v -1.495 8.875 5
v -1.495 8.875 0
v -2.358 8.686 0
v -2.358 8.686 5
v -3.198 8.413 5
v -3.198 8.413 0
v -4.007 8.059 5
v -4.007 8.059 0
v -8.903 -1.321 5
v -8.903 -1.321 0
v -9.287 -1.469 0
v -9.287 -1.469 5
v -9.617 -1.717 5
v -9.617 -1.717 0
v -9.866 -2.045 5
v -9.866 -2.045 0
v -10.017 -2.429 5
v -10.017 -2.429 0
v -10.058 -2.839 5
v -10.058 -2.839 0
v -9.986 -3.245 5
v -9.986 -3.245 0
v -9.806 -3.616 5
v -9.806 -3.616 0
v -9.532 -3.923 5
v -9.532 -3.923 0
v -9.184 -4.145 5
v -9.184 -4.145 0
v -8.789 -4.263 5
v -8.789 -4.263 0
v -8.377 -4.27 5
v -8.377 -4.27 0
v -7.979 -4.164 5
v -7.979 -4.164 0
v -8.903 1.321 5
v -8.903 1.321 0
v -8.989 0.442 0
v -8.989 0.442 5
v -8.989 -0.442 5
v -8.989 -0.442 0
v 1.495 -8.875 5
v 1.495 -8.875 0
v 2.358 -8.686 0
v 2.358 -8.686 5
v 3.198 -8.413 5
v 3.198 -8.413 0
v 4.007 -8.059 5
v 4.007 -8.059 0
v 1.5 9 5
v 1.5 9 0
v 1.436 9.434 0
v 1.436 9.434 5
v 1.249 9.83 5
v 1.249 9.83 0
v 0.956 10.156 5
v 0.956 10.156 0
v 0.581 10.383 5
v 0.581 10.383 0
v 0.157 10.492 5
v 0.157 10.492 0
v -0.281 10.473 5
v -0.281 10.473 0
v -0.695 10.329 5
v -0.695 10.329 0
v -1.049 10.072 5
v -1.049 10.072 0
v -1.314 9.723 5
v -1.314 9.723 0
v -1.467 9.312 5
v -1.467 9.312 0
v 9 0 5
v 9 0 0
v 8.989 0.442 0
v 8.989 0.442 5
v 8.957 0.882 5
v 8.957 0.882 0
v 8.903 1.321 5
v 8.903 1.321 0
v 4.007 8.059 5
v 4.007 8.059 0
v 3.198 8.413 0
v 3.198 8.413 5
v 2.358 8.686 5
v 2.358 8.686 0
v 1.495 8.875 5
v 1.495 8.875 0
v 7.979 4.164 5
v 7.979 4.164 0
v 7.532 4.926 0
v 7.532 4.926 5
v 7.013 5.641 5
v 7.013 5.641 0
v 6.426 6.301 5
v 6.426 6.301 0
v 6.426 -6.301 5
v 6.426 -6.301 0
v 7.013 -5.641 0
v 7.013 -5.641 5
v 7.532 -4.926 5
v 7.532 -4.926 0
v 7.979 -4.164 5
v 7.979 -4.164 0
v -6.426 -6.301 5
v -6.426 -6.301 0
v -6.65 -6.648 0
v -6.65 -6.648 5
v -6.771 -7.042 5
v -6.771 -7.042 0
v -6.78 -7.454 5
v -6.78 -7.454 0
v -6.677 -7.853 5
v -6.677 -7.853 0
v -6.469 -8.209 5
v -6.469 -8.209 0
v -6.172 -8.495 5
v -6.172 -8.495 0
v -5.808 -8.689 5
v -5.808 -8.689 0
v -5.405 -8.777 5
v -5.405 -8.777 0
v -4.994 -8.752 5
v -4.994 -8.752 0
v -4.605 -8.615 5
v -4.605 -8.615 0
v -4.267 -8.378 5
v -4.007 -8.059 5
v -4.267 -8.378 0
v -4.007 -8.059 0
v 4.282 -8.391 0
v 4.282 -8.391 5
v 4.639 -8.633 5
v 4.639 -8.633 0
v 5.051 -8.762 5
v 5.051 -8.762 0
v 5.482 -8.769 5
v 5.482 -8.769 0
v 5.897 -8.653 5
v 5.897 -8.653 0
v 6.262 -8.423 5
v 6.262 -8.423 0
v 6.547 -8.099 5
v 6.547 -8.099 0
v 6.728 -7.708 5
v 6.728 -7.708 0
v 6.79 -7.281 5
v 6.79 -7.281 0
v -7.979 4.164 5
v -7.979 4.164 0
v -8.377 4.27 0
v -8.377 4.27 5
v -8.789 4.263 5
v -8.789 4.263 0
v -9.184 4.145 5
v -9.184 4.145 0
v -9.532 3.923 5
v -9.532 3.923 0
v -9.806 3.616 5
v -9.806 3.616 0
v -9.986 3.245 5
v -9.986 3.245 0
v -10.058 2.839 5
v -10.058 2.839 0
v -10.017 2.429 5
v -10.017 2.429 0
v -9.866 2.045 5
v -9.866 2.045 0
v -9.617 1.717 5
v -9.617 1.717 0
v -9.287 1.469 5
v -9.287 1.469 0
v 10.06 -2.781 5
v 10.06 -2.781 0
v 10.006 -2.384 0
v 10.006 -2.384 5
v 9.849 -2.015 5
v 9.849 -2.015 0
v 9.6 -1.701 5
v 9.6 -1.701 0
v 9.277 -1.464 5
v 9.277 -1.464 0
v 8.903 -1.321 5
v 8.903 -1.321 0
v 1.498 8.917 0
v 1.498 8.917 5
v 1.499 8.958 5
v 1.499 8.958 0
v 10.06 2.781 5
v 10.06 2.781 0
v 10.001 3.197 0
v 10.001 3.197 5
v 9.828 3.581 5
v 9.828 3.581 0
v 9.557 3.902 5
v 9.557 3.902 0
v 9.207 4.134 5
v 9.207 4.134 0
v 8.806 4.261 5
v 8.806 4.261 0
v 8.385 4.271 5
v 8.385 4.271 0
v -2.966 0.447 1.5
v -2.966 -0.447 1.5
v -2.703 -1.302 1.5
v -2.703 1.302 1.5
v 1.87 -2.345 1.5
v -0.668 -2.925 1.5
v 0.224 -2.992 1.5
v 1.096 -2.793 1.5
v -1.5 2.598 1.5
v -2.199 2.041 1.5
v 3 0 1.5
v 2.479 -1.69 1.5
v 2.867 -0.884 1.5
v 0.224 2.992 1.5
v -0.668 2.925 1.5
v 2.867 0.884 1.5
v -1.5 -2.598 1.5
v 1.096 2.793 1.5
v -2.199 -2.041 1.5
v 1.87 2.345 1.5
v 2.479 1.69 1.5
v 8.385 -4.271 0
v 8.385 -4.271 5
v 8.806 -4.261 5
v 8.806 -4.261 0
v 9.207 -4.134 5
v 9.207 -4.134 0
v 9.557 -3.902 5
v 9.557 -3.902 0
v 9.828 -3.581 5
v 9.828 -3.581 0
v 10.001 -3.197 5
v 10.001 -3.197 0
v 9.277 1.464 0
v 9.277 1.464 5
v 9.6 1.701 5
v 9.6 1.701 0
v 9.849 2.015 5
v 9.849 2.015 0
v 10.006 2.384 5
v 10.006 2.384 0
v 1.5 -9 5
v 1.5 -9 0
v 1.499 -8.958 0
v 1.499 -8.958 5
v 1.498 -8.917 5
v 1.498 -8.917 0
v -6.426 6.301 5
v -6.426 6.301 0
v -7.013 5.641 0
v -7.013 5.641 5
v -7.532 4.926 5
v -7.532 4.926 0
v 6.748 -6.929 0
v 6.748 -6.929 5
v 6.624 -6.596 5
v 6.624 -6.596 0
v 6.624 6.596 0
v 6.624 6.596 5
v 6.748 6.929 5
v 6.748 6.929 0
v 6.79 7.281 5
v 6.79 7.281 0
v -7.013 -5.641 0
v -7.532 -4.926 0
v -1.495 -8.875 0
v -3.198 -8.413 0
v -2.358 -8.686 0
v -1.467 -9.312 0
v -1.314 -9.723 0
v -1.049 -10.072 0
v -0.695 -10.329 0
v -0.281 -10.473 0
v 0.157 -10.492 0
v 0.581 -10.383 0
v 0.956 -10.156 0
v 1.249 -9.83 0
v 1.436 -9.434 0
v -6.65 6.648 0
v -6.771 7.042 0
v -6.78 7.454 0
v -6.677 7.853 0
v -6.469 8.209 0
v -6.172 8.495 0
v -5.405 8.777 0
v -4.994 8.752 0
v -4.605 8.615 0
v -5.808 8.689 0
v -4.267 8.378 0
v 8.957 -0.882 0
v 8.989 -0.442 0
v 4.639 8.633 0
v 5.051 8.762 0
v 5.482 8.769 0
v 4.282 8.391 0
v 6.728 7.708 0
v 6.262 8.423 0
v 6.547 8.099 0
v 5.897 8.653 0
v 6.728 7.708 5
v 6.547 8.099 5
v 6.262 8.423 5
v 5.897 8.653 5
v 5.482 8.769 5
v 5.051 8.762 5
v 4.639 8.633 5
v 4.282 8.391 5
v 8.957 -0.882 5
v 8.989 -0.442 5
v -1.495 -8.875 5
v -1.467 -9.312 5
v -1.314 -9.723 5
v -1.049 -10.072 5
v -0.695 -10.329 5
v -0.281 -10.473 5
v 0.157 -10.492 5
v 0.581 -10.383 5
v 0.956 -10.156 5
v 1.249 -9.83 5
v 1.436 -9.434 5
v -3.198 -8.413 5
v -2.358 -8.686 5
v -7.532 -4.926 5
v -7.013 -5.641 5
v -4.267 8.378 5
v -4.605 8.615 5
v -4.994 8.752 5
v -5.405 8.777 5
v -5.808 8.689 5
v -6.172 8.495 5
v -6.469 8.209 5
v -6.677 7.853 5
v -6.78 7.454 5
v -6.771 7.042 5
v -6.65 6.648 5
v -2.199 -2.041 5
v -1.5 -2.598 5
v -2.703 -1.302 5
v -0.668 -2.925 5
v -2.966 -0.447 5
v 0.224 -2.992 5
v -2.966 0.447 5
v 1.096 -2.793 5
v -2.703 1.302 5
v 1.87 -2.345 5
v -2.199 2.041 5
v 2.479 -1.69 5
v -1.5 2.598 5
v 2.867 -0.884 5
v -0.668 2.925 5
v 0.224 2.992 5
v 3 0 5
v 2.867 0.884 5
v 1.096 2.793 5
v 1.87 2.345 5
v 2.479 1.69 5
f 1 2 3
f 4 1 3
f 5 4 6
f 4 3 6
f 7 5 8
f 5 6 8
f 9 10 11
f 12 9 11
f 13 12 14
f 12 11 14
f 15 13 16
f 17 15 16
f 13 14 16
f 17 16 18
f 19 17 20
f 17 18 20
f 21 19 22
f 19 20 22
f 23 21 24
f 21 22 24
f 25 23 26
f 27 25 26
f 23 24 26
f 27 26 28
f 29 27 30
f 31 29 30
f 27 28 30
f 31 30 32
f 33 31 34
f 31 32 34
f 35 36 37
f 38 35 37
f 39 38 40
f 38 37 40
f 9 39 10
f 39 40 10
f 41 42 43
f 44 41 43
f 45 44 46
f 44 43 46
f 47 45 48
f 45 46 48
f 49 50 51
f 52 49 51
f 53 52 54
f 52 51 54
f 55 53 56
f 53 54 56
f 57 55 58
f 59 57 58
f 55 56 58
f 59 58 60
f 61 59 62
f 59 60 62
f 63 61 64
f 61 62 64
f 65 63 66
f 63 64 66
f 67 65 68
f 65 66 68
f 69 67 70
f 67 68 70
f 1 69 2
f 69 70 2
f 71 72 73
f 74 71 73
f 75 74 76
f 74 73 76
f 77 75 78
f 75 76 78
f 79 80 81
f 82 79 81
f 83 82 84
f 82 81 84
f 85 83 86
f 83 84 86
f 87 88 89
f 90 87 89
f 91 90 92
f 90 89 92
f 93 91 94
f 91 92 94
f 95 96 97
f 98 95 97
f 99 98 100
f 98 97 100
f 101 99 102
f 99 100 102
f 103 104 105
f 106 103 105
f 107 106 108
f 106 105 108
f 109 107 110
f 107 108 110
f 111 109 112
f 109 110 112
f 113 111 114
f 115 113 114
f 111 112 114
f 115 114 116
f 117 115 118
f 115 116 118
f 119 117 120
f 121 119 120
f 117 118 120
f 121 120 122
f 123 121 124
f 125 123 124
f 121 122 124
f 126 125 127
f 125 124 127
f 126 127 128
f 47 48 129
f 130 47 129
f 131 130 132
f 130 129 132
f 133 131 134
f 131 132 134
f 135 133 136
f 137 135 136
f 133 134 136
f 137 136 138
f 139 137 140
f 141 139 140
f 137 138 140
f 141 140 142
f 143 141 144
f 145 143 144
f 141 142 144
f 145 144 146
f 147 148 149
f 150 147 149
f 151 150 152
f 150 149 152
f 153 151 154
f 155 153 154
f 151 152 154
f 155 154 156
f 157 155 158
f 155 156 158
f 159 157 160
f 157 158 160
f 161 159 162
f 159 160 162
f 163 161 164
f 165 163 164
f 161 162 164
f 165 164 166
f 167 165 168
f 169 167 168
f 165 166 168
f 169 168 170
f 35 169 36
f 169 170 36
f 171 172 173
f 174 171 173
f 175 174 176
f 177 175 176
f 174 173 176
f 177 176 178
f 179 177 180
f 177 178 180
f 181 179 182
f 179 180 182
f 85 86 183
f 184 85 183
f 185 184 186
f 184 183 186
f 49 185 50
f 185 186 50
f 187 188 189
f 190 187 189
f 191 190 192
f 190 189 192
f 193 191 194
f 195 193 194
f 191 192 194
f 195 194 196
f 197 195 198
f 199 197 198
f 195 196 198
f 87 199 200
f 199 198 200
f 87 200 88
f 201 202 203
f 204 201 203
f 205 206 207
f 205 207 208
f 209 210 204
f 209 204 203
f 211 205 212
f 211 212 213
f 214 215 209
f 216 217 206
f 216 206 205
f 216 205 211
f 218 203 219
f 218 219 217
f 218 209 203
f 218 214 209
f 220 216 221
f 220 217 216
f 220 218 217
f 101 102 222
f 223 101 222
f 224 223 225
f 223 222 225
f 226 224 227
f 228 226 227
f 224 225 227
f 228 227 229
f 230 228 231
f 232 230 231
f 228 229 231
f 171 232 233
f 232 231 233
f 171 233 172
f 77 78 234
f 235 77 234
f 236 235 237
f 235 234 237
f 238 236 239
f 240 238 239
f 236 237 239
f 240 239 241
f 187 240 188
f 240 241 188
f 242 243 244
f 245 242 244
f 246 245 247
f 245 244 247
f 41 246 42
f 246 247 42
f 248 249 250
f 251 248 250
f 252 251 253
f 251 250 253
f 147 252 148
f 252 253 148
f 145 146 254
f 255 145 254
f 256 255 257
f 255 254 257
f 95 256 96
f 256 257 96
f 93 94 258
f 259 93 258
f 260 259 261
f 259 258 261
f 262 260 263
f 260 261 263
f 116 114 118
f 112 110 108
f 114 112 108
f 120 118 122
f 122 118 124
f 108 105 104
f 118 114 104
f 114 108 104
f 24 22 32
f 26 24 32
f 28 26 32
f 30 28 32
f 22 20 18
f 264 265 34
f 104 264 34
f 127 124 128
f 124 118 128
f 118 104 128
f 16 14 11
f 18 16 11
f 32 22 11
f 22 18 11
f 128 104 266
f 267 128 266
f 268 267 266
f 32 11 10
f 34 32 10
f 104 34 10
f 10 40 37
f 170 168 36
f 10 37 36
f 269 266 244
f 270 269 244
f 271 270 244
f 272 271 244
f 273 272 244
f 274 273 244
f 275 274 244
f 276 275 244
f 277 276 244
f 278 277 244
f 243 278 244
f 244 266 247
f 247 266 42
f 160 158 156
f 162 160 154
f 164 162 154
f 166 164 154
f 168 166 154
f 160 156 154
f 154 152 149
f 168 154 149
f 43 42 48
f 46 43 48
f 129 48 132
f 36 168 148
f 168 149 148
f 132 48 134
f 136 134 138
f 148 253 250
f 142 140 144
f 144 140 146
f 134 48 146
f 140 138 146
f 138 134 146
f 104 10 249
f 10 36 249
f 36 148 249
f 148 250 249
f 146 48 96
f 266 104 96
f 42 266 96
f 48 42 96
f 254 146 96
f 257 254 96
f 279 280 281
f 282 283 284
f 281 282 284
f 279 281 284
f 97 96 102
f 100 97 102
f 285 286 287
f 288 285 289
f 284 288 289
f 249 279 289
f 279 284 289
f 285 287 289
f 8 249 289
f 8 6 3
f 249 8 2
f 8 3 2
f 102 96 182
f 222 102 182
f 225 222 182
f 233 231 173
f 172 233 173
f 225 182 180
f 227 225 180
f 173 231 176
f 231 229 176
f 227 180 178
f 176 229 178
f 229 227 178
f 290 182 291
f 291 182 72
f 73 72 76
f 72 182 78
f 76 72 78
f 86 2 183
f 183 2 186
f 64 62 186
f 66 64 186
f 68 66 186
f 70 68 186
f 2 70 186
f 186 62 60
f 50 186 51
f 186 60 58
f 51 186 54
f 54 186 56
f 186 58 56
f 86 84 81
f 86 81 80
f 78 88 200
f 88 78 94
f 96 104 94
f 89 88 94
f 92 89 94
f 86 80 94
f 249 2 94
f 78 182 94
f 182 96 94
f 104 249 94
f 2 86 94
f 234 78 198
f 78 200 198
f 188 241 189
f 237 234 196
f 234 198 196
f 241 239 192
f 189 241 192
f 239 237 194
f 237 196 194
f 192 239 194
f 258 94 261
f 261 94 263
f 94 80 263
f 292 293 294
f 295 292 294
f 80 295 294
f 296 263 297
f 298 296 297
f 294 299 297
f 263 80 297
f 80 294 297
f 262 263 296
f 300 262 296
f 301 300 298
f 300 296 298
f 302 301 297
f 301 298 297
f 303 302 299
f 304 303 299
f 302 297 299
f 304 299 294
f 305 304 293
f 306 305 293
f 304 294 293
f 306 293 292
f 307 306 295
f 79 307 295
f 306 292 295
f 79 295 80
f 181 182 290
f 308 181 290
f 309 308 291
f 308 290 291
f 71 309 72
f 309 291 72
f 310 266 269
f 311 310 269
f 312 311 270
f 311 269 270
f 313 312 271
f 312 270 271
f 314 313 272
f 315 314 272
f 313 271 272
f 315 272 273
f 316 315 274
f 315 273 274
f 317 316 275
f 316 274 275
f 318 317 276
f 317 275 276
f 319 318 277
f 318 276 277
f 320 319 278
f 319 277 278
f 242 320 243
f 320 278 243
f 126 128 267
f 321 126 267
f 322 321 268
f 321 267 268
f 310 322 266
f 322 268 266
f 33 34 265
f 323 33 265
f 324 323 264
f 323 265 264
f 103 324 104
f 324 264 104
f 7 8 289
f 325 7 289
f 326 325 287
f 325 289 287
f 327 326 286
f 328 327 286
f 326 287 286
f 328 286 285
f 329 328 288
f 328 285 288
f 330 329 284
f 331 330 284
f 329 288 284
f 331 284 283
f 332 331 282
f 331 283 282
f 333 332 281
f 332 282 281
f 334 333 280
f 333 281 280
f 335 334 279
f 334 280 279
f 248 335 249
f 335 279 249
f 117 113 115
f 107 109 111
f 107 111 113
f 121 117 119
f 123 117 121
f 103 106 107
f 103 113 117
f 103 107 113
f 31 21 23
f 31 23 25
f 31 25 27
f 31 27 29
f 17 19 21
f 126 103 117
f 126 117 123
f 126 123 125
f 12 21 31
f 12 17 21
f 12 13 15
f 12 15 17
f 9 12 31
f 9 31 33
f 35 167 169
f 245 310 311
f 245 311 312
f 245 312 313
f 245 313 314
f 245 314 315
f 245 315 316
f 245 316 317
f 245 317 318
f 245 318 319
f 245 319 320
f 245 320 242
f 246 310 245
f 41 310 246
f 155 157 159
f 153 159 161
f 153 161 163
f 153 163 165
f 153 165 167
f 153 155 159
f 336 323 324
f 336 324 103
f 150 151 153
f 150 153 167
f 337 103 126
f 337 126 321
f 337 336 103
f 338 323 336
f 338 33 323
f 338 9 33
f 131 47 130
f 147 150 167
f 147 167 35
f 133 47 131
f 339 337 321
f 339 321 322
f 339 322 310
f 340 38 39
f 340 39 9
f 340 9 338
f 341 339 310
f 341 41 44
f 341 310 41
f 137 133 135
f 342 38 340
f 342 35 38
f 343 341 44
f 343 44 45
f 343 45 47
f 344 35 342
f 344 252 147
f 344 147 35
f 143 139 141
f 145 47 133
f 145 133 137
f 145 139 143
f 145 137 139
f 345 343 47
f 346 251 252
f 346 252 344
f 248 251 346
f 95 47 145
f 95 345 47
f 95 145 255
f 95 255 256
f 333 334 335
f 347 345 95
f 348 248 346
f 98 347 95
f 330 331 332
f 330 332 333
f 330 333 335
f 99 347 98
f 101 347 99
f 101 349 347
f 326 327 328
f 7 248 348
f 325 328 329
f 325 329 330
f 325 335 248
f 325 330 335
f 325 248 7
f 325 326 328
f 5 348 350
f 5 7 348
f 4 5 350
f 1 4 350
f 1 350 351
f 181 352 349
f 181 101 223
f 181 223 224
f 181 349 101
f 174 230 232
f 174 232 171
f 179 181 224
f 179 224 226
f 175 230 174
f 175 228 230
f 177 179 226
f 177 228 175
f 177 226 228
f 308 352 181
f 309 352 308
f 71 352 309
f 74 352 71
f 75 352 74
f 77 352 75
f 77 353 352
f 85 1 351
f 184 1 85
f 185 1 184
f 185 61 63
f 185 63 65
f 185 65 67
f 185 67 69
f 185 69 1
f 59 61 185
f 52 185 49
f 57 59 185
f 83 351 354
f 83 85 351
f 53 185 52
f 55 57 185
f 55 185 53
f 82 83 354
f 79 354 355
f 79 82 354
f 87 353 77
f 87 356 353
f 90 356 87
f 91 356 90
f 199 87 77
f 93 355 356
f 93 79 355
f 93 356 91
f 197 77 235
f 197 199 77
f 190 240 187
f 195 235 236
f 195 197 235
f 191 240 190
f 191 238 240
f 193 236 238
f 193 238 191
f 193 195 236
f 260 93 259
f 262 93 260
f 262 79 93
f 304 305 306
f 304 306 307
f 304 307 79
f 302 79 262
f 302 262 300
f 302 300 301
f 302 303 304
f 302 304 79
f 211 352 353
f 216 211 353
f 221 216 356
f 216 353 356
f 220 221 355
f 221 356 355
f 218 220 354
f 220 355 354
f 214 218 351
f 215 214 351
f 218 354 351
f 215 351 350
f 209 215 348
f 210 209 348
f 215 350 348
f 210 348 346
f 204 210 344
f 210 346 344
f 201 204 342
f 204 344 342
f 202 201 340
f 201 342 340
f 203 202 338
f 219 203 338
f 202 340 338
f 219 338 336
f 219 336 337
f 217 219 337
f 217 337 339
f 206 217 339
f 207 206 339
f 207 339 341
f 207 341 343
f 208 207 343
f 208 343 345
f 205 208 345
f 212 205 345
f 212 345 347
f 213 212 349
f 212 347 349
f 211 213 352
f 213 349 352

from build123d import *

# Parameters (mm, degrees)
F0_R     = 3
F1_DEPTH = 5
F2_R     = 3
F3_DEPTH = 3.5


with BuildPart() as f1:
    # F0 (on Top) → F1 (new body)
    with BuildSketch(Plane.XY):
        with BuildLine():
            ThreePointArc((-6.4258986346, 6.3014146616), (-5.2900672706, 7.2811529494), (-4.0072895936, 8.0586369886))
            ThreePointArc((-4.0072895936, 8.0586369886), (-6.1717451491, 8.4946784409), (-6.4258986346, 6.3014146616))
        make_face()
        with BuildLine():
            ThreePointArc((-1.4947825929, 8.875), (0, 9), (1.4947825929, 8.875))
            ThreePointArc((1.4947825929, 8.875), (1.4986950806, 8.937445581), (1.5, 9))
            ThreePointArc((1.5, 9), (-0.062554419, 10.4986950806), (-1.4947825929, 8.875))
        make_face()
        with BuildLine():
            ThreePointArc((4.0072895936, 8.0586369886), (5.2900672706, 7.2811529494), (6.4258986346, 6.3014146616))
            ThreePointArc((6.4258986346, 6.3014146616), (6.6960806145, 6.7585379123), (6.7900672706, 7.2811529494))
            ThreePointArc((6.7900672706, 7.2811529494), (5.6936967321, 8.7258270503), (4.0072895936, 8.0586369886))
        make_face()
        with BuildLine():
            ThreePointArc((7.978713358, 4.1641485505), (8.5595086467, 2.7811529494), (8.9025398062, 1.3209030997))
            ThreePointArc((8.9025398062, 1.3209030997), (9.7352098713, 1.8496344953), (10.0595086467, 2.7811529494))
            ThreePointArc((10.0595086467, 2.7811529494), (9.3898119247, 4.0303913039), (7.978713358, 4.1641485505))
        make_face()
        with BuildLine():
            ThreePointArc((10.0595086467, -2.7811529494), (9.7352098713, -1.8496344953), (8.9025398062, -1.3209030997))
            ThreePointArc((8.9025398062, -1.3209030997), (8.5595086467, -2.7811529494), (7.978713358, -4.1641485505))
            ThreePointArc((7.978713358, -4.1641485505), (9.3898119247, -4.0303913039), (10.0595086467, -2.7811529494))
        make_face()
        with BuildLine():
            ThreePointArc((6.7900672706, -7.2811529494), (6.6960806145, -6.7585379123), (6.4258986346, -6.3014146616))
            ThreePointArc((6.4258986346, -6.3014146616), (5.2900672706, -7.2811529494), (4.0072895936, -8.0586369886))
            ThreePointArc((4.0072895936, -8.0586369886), (5.6936967321, -8.7258270503), (6.7900672706, -7.2811529494))
        make_face()
        with BuildLine():
            ThreePointArc((1.5, -9), (1.4986950806, -8.937445581), (1.4947825929, -8.875))
            ThreePointArc((1.4947825929, -8.875), (0, -9), (-1.4947825929, -8.875))
            ThreePointArc((-1.4947825929, -8.875), (-0.062554419, -10.4986950806), (1.5, -9))
        make_face()
        with BuildLine():
            ThreePointArc((-6.4258986346, -6.3014146616), (-6.1717451491, -8.4946784409), (-4.0072895936, -8.0586369886))
            ThreePointArc((-4.0072895936, -8.0586369886), (-5.2900672706, -7.2811529494), (-6.4258986346, -6.3014146616))
        make_face()
        with BuildLine():
            ThreePointArc((-8.9025398062, -1.3209030997), (-9.9860934211, -3.2446784409), (-7.978713358, -4.1641485505))
            ThreePointArc((-7.978713358, -4.1641485505), (-8.5595086467, -2.7811529494), (-8.9025398062, -1.3209030997))
        make_face()
        with BuildLine():
            ThreePointArc((-8.9025398062, 1.3209030997), (-8.5595086467, 2.7811529494), (-7.978713358, 4.1641485505))
            ThreePointArc((-7.978713358, 4.1641485505), (-9.9860934211, 3.2446784409), (-8.9025398062, 1.3209030997))
        make_face()
        with BuildLine():
            ThreePointArc((8.9025398062, -1.3209030997), (8.9756018811, -0.6622468362), (9, 0))
            ThreePointArc((9, 0), (8.9756018811, 0.6622468362), (8.9025398062, 1.3209030997))
            ThreePointArc((8.9025398062, 1.3209030997), (7.1329238722, 2.3176274578), (7.978713358, 4.1641485505))
            ThreePointArc((7.978713358, 4.1641485505), (7.2811529494, 5.2900672706), (6.4258986346, 6.3014146616))
            ThreePointArc((6.4258986346, 6.3014146616), (4.4083893922, 6.0676274578), (4.0072895936, 8.0586369886))
            ThreePointArc((4.0072895936, 8.0586369886), (2.7811529494, 8.5595086467), (1.4947825929, 8.875))
            ThreePointArc((1.4947825929, 8.875), (0, 7.5), (-1.4947825929, 8.875))
            ThreePointArc((-1.4947825929, 8.875), (-2.7811529494, 8.5595086467), (-4.0072895936, 8.0586369886))
            ThreePointArc((-4.0072895936, 8.0586369886), (-3.8453931697, 7.6847824109), (-3.7900672706, 7.2811529494))
            ThreePointArc((-3.7900672706, 7.2811529494), (-4.7674522335, 5.8751396056), (-6.4258986346, 6.3014146616))
            ThreePointArc((-6.4258986346, 6.3014146616), (-7.2811529494, 5.2900672706), (-7.978713358, 4.1641485505))
            ThreePointArc((-7.978713358, 4.1641485505), (-7.3102702921, 3.6114562274), (-7.0595086467, 2.7811529494))
            ThreePointArc((-7.0595086467, 2.7811529494), (-7.6279901926, 1.6054517247), (-8.9025398062, 1.3209030997))
            ThreePointArc((-8.9025398062, 1.3209030997), (-9, 0), (-8.9025398062, -1.3209030997))
            ThreePointArc((-8.9025398062, -1.3209030997), (-7.6279901926, -1.6054517247), (-7.0595086467, -2.7811529494))
            ThreePointArc((-7.0595086467, -2.7811529494), (-7.3102702921, -3.6114562274), (-7.978713358, -4.1641485505))
            ThreePointArc((-7.978713358, -4.1641485505), (-7.2811529494, -5.2900672706), (-6.4258986346, -6.3014146616))
            ThreePointArc((-6.4258986346, -6.3014146616), (-4.7674522335, -5.8751396056), (-3.7900672706, -7.2811529494))
            ThreePointArc((-3.7900672706, -7.2811529494), (-3.8453931697, -7.6847824109), (-4.0072895936, -8.0586369886))
            ThreePointArc((-4.0072895936, -8.0586369886), (-2.7811529494, -8.5595086467), (-1.4947825929, -8.875))
            ThreePointArc((-1.4947825929, -8.875), (0, -7.5), (1.4947825929, -8.875))
            ThreePointArc((1.4947825929, -8.875), (2.7811529494, -8.5595086467), (4.0072895936, -8.0586369886))
            ThreePointArc((4.0072895936, -8.0586369886), (4.4083893922, -6.0676274578), (6.4258986346, -6.3014146616))
            ThreePointArc((6.4258986346, -6.3014146616), (7.2811529494, -5.2900672706), (7.978713358, -4.1641485505))
            ThreePointArc((7.978713358, -4.1641485505), (7.1329238722, -2.3176274578), (8.9025398062, -1.3209030997))
        make_face()
        Circle(F0_R, mode=Mode.SUBTRACT)
        with BuildLine():
            ThreePointArc((-7.0595086467, 2.7811529494), (-7.3102702921, 3.6114562274), (-7.978713358, 4.1641485505))
            ThreePointArc((-7.978713358, 4.1641485505), (-8.5595086467, 2.7811529494), (-8.9025398062, 1.3209030997))
            ThreePointArc((-8.9025398062, 1.3209030997), (-7.6279901926, 1.6054517247), (-7.0595086467, 2.7811529494))
        make_face()
        with BuildLine():
            ThreePointArc((-3.7900672706, 7.2811529494), (-3.8453931697, 7.6847824109), (-4.0072895936, 8.0586369886))
            ThreePointArc((-4.0072895936, 8.0586369886), (-5.2900672706, 7.2811529494), (-6.4258986346, 6.3014146616))
            ThreePointArc((-6.4258986346, 6.3014146616), (-4.7674522335, 5.8751396056), (-3.7900672706, 7.2811529494))
        make_face()
        with BuildLine():
            ThreePointArc((-1.4947825929, 8.875), (0, 7.5), (1.4947825929, 8.875))
            ThreePointArc((1.4947825929, 8.875), (0, 9), (-1.4947825929, 8.875))
        make_face()
        with BuildLine():
            ThreePointArc((4.0072895936, 8.0586369886), (4.4083893922, 6.0676274578), (6.4258986346, 6.3014146616))
            ThreePointArc((6.4258986346, 6.3014146616), (5.2900672706, 7.2811529494), (4.0072895936, 8.0586369886))
        make_face()
        with BuildLine():
            ThreePointArc((7.978713358, 4.1641485505), (7.1329238722, 2.3176274578), (8.9025398062, 1.3209030997))
            ThreePointArc((8.9025398062, 1.3209030997), (8.5595086467, 2.7811529494), (7.978713358, 4.1641485505))
        make_face()
        with BuildLine():
            ThreePointArc((7.978713358, -4.1641485505), (8.5595086467, -2.7811529494), (8.9025398062, -1.3209030997))
            ThreePointArc((8.9025398062, -1.3209030997), (7.1329238722, -2.3176274578), (7.978713358, -4.1641485505))
        make_face()
        with BuildLine():
            ThreePointArc((4.0072895936, -8.0586369886), (5.2900672706, -7.2811529494), (6.4258986346, -6.3014146616))
            ThreePointArc((6.4258986346, -6.3014146616), (4.4083893922, -6.0676274578), (4.0072895936, -8.0586369886))
        make_face()
        with BuildLine():
            ThreePointArc((-1.4947825929, -8.875), (0, -9), (1.4947825929, -8.875))
            ThreePointArc((1.4947825929, -8.875), (0, -7.5), (-1.4947825929, -8.875))
        make_face()
        Circle(F0_R)
        with BuildLine():
            ThreePointArc((-6.4258986346, -6.3014146616), (-5.2900672706, -7.2811529494), (-4.0072895936, -8.0586369886))
            ThreePointArc((-4.0072895936, -8.0586369886), (-3.8453931697, -7.6847824109), (-3.7900672706, -7.2811529494))
            ThreePointArc((-3.7900672706, -7.2811529494), (-4.7674522335, -5.8751396056), (-6.4258986346, -6.3014146616))
        make_face()
        with BuildLine():
            ThreePointArc((-8.9025398062, -1.3209030997), (-8.5595086467, -2.7811529494), (-7.978713358, -4.1641485505))
            ThreePointArc((-7.978713358, -4.1641485505), (-7.3102702921, -3.6114562274), (-7.0595086467, -2.7811529494))
            ThreePointArc((-7.0595086467, -2.7811529494), (-7.6279901926, -1.6054517247), (-8.9025398062, -1.3209030997))
        make_face()
    extrude(amount=F1_DEPTH)

    # F2 (on face) → F3 (cut)
    with BuildSketch(Plane.XY.offset(5)):
        Circle(F2_R)
    extrude(amount=-F3_DEPTH, mode=Mode.SUBTRACT)


solid = f1.part
